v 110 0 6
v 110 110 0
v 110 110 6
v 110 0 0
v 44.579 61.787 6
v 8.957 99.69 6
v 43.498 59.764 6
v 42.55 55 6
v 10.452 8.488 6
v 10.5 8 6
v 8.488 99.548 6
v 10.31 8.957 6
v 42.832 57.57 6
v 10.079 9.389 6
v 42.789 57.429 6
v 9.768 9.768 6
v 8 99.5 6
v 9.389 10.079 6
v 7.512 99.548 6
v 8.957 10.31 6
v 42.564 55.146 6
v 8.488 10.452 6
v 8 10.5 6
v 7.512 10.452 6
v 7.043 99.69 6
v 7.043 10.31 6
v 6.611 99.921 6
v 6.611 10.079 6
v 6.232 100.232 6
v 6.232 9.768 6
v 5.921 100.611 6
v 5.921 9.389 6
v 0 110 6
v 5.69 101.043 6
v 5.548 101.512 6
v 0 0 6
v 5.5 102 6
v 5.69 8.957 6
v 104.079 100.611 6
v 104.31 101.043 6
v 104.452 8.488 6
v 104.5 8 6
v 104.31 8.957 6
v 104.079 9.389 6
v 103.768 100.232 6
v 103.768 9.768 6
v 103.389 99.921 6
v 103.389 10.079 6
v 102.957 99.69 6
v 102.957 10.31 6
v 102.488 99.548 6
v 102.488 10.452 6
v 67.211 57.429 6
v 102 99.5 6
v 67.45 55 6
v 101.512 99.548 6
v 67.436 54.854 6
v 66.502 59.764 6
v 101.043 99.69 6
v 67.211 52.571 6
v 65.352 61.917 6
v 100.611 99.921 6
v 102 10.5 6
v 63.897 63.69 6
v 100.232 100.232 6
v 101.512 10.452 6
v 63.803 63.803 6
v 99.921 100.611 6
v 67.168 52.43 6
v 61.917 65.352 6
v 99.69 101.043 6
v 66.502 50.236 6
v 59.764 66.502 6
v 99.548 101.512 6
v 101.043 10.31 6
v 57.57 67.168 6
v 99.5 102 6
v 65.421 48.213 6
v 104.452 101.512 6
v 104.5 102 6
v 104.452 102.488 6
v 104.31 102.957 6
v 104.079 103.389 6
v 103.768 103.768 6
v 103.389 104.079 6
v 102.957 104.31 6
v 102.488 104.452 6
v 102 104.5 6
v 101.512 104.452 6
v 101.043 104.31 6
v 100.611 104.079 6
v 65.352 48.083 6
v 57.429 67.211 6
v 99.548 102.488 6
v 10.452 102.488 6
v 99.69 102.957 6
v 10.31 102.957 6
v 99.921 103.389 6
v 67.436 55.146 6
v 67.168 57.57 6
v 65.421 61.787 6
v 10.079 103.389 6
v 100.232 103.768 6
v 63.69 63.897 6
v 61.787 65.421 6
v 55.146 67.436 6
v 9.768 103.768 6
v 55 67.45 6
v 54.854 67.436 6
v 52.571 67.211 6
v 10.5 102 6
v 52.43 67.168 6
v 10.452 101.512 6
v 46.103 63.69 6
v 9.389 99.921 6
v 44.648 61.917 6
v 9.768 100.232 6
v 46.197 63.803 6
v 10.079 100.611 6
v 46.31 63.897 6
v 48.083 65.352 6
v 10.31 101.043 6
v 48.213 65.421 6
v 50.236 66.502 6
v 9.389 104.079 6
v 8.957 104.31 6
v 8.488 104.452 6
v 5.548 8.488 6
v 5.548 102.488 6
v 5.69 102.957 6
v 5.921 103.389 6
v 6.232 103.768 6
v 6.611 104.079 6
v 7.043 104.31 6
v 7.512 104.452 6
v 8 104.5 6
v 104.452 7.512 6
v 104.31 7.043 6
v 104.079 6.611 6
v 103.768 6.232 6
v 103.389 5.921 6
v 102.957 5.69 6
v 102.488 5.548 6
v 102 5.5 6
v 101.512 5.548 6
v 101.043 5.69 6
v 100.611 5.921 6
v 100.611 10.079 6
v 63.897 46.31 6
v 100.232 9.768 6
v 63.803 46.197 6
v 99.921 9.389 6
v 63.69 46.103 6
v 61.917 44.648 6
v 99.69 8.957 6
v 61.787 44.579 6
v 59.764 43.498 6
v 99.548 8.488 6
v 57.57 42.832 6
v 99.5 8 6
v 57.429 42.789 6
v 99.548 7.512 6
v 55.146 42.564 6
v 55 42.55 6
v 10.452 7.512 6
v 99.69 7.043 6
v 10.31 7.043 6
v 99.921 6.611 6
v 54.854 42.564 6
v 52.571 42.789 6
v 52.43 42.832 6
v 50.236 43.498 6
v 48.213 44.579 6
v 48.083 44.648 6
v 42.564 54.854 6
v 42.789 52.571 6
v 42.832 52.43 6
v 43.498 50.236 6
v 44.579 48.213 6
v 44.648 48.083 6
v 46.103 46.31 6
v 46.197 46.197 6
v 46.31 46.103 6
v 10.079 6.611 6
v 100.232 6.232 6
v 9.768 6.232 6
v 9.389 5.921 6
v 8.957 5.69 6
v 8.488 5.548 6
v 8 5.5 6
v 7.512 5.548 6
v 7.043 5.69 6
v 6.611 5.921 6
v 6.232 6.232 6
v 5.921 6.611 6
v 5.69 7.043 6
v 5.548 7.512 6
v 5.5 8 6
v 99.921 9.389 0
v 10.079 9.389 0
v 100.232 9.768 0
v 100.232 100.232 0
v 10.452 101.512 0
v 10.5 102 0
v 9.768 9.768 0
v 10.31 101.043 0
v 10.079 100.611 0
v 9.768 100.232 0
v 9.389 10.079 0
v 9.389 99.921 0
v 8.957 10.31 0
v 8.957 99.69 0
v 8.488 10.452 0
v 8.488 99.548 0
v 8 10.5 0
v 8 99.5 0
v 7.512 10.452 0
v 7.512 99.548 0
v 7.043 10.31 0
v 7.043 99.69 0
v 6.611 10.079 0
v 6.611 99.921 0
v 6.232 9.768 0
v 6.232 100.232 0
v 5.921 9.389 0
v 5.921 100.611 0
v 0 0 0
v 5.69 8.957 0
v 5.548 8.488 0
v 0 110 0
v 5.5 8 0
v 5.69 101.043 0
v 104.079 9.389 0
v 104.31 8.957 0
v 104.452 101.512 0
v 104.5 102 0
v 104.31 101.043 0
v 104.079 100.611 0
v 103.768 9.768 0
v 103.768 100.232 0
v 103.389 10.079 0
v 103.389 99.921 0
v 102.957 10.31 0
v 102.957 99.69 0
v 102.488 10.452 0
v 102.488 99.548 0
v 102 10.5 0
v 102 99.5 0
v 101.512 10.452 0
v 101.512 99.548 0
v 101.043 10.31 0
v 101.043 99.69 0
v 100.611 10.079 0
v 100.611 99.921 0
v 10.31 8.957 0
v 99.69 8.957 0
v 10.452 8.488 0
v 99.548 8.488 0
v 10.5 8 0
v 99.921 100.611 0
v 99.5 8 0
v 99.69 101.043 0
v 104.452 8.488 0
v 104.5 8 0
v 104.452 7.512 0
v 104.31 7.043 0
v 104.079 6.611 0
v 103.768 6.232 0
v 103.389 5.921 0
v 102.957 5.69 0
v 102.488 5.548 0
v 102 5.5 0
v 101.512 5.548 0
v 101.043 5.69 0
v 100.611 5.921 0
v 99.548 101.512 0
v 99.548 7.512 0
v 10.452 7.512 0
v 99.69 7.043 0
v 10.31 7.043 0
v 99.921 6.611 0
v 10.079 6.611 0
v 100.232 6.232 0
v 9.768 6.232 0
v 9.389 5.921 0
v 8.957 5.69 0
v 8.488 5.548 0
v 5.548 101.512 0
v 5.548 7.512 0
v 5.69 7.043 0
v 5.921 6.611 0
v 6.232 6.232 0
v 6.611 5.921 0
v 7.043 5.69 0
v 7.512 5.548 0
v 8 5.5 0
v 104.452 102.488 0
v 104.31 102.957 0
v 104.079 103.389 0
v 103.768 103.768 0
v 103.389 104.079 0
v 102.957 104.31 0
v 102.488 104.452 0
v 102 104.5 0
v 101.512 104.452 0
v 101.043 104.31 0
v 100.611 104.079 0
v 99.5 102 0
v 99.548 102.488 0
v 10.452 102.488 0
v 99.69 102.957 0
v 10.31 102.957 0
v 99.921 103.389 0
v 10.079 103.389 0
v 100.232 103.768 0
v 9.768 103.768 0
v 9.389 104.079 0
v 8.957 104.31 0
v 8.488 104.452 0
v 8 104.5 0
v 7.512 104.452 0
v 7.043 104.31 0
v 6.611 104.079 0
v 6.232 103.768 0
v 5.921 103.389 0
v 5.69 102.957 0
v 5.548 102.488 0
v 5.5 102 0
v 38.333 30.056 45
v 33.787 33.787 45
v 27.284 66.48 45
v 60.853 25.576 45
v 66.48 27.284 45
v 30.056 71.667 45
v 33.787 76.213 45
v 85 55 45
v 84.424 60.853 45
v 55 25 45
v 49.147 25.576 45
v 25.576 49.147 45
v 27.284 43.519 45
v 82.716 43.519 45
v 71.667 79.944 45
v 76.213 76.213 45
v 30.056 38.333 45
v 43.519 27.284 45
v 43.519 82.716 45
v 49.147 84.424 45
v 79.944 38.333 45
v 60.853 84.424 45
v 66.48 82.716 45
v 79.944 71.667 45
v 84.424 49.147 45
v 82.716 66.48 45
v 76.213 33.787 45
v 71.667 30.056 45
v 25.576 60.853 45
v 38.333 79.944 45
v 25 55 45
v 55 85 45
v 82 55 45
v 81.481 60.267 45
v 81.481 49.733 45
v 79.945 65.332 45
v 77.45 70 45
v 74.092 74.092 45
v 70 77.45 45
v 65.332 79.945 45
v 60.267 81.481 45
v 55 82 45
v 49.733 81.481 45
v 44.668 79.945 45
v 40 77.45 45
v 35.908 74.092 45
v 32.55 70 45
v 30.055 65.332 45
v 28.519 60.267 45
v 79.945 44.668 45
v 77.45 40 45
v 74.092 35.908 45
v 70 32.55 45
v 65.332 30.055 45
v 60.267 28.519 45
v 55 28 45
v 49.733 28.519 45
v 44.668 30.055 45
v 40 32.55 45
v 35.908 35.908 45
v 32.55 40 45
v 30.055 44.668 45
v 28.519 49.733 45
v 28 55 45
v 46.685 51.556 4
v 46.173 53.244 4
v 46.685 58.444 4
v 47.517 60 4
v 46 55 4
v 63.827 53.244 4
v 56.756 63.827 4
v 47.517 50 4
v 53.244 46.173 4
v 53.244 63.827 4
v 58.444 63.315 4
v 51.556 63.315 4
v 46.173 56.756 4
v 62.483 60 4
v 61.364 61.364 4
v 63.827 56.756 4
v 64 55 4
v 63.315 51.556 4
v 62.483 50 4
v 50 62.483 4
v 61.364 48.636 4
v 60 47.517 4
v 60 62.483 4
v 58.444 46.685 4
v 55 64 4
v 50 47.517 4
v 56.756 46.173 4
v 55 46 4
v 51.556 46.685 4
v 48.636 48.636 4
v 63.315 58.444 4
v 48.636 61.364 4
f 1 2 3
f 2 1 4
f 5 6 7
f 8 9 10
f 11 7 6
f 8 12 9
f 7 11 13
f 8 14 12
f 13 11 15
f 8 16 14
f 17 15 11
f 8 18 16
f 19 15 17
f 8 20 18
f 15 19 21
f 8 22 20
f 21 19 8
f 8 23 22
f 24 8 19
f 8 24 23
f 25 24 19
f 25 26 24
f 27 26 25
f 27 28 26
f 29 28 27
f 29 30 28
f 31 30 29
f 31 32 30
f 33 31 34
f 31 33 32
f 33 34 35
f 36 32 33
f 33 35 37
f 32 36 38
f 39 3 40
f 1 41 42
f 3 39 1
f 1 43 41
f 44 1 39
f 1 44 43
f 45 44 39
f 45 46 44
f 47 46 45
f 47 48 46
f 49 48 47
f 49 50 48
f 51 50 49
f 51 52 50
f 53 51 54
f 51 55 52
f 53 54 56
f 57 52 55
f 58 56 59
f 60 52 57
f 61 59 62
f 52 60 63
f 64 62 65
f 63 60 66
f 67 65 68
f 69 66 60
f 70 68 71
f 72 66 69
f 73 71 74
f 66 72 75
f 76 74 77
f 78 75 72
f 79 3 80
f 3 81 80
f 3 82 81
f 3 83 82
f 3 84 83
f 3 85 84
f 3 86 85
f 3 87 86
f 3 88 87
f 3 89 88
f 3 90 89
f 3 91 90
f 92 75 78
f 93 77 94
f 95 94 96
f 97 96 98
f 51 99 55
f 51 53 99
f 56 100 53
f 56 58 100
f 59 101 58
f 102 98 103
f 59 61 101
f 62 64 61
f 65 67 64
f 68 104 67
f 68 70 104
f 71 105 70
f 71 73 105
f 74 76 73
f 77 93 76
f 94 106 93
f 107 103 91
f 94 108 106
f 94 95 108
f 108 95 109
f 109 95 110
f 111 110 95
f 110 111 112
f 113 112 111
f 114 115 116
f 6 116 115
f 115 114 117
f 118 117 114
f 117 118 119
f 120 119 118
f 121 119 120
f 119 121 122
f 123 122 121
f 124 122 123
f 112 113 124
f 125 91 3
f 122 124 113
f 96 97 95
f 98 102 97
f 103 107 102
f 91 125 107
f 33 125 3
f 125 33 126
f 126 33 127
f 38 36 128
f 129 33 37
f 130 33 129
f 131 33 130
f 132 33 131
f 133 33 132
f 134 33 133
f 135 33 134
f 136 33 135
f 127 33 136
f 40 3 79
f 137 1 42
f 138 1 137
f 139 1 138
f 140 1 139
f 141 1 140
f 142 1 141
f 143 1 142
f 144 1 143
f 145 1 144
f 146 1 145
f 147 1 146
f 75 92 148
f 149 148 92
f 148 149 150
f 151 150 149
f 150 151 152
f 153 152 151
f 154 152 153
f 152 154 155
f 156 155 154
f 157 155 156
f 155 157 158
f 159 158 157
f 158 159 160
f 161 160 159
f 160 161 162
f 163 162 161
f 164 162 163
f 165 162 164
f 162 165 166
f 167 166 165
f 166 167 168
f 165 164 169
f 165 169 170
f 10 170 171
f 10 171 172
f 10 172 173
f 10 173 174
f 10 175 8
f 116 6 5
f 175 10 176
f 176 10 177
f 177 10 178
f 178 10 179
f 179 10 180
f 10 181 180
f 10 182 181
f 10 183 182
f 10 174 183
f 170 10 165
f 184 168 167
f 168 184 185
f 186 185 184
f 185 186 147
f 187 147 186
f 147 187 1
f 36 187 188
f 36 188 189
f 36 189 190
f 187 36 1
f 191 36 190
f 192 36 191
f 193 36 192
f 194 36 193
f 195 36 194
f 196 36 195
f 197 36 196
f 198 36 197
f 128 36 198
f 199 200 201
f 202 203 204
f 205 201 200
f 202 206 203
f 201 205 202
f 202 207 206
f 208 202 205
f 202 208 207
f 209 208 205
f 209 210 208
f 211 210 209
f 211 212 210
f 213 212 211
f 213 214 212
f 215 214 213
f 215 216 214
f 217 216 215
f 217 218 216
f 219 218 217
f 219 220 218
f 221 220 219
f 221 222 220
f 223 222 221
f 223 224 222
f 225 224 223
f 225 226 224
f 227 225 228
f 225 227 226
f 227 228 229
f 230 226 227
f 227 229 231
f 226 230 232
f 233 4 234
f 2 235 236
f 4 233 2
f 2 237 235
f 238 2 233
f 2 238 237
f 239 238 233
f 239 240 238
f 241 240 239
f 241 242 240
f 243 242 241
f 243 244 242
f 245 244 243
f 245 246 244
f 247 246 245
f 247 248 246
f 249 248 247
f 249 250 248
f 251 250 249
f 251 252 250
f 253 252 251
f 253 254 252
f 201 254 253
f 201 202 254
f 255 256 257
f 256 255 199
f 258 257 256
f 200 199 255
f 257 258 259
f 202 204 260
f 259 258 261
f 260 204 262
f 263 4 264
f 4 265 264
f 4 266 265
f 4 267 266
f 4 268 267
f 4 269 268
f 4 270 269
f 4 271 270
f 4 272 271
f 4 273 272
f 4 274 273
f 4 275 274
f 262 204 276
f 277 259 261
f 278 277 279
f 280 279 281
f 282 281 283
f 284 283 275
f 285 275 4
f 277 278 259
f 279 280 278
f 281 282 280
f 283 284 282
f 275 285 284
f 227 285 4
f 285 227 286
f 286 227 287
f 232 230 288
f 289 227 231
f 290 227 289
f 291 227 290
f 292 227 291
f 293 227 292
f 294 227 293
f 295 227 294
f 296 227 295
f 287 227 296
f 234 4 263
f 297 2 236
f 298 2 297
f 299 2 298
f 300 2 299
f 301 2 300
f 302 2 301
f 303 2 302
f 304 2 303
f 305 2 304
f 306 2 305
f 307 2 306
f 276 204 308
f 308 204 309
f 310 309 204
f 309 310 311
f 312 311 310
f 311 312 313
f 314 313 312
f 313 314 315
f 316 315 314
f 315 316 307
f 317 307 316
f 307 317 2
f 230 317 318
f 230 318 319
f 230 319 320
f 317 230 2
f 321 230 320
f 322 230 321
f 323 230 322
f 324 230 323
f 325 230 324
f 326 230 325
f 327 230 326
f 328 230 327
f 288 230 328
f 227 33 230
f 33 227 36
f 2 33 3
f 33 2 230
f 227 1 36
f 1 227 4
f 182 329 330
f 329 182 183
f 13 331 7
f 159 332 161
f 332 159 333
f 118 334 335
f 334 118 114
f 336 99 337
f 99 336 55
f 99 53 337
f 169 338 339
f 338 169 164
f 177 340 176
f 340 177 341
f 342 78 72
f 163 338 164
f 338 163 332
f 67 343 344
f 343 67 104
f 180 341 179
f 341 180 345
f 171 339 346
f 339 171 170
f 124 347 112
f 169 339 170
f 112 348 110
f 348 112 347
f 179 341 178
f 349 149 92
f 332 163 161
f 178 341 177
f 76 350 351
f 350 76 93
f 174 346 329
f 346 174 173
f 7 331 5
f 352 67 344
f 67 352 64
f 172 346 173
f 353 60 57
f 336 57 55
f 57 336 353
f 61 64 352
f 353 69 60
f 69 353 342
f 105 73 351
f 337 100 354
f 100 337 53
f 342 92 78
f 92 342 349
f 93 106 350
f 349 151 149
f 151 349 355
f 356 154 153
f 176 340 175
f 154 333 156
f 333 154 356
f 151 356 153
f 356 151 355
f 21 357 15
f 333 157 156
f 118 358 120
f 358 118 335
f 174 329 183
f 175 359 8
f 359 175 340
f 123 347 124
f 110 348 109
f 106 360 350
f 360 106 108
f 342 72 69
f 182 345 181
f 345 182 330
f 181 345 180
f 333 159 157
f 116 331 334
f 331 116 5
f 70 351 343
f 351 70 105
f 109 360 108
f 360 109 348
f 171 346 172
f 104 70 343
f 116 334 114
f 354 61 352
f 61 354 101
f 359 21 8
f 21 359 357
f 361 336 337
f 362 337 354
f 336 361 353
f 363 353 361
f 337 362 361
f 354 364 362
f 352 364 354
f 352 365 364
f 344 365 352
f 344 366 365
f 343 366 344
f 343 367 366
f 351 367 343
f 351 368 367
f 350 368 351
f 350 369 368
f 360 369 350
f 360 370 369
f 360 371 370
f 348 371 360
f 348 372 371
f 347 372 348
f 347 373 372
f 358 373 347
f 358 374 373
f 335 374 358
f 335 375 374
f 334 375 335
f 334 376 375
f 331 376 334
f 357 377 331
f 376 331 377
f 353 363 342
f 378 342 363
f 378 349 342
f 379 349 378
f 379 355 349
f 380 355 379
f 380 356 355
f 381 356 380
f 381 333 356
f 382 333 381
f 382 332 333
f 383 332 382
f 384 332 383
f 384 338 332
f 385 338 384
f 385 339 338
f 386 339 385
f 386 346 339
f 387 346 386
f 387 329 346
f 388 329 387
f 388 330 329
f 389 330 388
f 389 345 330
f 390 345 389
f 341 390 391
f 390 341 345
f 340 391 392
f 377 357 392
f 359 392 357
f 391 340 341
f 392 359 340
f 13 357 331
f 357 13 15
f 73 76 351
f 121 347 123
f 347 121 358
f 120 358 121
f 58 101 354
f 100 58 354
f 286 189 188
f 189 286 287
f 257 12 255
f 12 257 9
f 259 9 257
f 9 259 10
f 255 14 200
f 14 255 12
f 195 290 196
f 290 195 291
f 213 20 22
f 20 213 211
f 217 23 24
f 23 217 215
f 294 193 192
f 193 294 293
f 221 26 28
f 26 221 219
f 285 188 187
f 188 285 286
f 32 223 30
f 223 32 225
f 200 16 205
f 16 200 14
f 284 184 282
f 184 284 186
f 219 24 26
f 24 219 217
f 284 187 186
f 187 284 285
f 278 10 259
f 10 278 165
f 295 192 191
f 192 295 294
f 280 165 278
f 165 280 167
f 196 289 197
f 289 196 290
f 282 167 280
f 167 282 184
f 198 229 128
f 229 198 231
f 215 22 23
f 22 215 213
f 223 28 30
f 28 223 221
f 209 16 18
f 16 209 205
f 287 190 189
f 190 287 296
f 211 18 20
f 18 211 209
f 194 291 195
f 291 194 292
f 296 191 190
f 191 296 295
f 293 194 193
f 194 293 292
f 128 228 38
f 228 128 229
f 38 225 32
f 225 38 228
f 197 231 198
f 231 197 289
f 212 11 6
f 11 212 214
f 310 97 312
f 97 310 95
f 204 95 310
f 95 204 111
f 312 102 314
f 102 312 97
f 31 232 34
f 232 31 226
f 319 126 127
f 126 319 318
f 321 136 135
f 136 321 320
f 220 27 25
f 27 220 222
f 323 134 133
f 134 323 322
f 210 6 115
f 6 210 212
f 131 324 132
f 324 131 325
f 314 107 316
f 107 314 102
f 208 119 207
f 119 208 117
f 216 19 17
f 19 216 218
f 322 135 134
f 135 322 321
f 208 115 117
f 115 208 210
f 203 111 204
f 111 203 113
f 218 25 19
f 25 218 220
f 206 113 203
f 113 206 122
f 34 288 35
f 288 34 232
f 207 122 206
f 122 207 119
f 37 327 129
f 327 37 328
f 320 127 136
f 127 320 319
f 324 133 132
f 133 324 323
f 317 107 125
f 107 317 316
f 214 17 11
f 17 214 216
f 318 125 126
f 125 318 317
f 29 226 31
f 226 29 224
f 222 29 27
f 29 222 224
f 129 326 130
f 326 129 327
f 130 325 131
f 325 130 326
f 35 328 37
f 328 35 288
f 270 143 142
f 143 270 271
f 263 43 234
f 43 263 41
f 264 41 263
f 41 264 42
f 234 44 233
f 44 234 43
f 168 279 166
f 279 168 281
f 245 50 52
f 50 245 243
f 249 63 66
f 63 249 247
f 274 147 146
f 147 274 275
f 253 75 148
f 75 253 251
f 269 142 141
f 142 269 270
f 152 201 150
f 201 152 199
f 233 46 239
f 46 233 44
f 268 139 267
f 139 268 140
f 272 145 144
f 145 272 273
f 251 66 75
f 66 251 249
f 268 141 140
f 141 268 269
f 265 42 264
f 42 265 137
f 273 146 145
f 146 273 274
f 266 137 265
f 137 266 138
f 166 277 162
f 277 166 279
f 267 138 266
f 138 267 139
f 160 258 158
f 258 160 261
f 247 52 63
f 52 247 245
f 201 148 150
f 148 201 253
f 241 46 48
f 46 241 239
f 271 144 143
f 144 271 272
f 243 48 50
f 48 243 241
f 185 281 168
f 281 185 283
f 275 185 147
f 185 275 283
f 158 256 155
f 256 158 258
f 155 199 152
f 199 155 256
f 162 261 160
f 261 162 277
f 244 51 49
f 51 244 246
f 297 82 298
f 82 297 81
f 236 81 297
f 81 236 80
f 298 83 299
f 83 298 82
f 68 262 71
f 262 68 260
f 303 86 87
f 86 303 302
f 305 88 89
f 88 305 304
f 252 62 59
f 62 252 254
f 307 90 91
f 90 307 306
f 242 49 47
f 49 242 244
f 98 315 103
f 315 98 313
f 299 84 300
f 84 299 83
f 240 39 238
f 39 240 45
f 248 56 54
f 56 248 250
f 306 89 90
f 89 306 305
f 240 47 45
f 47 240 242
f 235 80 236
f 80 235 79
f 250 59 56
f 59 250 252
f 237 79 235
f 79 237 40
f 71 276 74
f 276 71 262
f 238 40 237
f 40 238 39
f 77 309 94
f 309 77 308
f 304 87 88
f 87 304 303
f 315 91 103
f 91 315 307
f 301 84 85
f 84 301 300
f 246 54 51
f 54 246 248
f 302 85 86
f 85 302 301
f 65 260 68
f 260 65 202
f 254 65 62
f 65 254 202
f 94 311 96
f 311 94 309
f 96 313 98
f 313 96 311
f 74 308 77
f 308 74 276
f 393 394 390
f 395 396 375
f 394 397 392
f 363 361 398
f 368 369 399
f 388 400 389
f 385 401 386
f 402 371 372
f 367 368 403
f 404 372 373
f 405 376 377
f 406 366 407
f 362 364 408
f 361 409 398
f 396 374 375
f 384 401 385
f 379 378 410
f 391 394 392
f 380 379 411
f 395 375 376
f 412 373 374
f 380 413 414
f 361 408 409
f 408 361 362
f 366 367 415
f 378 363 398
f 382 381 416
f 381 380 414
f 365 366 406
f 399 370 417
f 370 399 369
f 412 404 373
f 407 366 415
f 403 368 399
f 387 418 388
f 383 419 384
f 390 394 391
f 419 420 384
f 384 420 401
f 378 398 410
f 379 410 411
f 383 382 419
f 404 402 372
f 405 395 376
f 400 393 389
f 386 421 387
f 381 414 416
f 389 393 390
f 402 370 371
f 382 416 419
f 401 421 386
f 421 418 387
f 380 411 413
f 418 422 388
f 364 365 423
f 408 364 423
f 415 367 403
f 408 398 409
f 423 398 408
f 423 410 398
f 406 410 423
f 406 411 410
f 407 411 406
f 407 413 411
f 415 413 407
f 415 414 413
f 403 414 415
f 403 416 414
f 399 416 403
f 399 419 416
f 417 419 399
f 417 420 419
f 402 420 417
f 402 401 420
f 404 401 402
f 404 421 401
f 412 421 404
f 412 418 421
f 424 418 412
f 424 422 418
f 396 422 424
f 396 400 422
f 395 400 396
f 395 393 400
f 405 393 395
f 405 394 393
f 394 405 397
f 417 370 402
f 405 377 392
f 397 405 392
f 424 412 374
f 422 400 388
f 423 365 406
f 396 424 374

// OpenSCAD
$fn = 32;

// ----------------------------------------------------------------------
// Hopper: flanged with square flange
// ----------------------------------------------------------------------

// --- parameters (mm) ---
fl = 110;                 // flange side, X and Y
fl_t = 6;                 // flange thickness
cone_h = 40;              // cone height above the flange
top_d = 60;               // cone mouth diameter
bot_d = 24;               // cone spout diameter
wall = 3;                 // cone wall thickness
hole_r = 2.5;             // flange hole radius
hole_in = 8;              // hole inset from the corners

bore_d = bot_d - 2 * wall;  // spout bore diameter
total_h = fl_t + cone_h - 1;  // overall height

difference() {
  union() {
    cube([fl, fl, fl_t]);
    translate([fl / 2, fl / 2, fl_t - 1])
      cylinder(h = cone_h, d1 = bot_d, d2 = top_d);
  }
  translate([fl / 2, fl / 2, fl_t - 2])
    cylinder(h = cone_h + 1, d1 = bore_d, d2 = top_d - 2 * wall);
  for (sx = [0, 1], sy = [0, 1])
    translate([sx ? fl - hole_in : hole_in,
               sy ? fl - hole_in : hole_in, -1])
      cylinder(r = hole_r, h = fl_t + 2);
}
